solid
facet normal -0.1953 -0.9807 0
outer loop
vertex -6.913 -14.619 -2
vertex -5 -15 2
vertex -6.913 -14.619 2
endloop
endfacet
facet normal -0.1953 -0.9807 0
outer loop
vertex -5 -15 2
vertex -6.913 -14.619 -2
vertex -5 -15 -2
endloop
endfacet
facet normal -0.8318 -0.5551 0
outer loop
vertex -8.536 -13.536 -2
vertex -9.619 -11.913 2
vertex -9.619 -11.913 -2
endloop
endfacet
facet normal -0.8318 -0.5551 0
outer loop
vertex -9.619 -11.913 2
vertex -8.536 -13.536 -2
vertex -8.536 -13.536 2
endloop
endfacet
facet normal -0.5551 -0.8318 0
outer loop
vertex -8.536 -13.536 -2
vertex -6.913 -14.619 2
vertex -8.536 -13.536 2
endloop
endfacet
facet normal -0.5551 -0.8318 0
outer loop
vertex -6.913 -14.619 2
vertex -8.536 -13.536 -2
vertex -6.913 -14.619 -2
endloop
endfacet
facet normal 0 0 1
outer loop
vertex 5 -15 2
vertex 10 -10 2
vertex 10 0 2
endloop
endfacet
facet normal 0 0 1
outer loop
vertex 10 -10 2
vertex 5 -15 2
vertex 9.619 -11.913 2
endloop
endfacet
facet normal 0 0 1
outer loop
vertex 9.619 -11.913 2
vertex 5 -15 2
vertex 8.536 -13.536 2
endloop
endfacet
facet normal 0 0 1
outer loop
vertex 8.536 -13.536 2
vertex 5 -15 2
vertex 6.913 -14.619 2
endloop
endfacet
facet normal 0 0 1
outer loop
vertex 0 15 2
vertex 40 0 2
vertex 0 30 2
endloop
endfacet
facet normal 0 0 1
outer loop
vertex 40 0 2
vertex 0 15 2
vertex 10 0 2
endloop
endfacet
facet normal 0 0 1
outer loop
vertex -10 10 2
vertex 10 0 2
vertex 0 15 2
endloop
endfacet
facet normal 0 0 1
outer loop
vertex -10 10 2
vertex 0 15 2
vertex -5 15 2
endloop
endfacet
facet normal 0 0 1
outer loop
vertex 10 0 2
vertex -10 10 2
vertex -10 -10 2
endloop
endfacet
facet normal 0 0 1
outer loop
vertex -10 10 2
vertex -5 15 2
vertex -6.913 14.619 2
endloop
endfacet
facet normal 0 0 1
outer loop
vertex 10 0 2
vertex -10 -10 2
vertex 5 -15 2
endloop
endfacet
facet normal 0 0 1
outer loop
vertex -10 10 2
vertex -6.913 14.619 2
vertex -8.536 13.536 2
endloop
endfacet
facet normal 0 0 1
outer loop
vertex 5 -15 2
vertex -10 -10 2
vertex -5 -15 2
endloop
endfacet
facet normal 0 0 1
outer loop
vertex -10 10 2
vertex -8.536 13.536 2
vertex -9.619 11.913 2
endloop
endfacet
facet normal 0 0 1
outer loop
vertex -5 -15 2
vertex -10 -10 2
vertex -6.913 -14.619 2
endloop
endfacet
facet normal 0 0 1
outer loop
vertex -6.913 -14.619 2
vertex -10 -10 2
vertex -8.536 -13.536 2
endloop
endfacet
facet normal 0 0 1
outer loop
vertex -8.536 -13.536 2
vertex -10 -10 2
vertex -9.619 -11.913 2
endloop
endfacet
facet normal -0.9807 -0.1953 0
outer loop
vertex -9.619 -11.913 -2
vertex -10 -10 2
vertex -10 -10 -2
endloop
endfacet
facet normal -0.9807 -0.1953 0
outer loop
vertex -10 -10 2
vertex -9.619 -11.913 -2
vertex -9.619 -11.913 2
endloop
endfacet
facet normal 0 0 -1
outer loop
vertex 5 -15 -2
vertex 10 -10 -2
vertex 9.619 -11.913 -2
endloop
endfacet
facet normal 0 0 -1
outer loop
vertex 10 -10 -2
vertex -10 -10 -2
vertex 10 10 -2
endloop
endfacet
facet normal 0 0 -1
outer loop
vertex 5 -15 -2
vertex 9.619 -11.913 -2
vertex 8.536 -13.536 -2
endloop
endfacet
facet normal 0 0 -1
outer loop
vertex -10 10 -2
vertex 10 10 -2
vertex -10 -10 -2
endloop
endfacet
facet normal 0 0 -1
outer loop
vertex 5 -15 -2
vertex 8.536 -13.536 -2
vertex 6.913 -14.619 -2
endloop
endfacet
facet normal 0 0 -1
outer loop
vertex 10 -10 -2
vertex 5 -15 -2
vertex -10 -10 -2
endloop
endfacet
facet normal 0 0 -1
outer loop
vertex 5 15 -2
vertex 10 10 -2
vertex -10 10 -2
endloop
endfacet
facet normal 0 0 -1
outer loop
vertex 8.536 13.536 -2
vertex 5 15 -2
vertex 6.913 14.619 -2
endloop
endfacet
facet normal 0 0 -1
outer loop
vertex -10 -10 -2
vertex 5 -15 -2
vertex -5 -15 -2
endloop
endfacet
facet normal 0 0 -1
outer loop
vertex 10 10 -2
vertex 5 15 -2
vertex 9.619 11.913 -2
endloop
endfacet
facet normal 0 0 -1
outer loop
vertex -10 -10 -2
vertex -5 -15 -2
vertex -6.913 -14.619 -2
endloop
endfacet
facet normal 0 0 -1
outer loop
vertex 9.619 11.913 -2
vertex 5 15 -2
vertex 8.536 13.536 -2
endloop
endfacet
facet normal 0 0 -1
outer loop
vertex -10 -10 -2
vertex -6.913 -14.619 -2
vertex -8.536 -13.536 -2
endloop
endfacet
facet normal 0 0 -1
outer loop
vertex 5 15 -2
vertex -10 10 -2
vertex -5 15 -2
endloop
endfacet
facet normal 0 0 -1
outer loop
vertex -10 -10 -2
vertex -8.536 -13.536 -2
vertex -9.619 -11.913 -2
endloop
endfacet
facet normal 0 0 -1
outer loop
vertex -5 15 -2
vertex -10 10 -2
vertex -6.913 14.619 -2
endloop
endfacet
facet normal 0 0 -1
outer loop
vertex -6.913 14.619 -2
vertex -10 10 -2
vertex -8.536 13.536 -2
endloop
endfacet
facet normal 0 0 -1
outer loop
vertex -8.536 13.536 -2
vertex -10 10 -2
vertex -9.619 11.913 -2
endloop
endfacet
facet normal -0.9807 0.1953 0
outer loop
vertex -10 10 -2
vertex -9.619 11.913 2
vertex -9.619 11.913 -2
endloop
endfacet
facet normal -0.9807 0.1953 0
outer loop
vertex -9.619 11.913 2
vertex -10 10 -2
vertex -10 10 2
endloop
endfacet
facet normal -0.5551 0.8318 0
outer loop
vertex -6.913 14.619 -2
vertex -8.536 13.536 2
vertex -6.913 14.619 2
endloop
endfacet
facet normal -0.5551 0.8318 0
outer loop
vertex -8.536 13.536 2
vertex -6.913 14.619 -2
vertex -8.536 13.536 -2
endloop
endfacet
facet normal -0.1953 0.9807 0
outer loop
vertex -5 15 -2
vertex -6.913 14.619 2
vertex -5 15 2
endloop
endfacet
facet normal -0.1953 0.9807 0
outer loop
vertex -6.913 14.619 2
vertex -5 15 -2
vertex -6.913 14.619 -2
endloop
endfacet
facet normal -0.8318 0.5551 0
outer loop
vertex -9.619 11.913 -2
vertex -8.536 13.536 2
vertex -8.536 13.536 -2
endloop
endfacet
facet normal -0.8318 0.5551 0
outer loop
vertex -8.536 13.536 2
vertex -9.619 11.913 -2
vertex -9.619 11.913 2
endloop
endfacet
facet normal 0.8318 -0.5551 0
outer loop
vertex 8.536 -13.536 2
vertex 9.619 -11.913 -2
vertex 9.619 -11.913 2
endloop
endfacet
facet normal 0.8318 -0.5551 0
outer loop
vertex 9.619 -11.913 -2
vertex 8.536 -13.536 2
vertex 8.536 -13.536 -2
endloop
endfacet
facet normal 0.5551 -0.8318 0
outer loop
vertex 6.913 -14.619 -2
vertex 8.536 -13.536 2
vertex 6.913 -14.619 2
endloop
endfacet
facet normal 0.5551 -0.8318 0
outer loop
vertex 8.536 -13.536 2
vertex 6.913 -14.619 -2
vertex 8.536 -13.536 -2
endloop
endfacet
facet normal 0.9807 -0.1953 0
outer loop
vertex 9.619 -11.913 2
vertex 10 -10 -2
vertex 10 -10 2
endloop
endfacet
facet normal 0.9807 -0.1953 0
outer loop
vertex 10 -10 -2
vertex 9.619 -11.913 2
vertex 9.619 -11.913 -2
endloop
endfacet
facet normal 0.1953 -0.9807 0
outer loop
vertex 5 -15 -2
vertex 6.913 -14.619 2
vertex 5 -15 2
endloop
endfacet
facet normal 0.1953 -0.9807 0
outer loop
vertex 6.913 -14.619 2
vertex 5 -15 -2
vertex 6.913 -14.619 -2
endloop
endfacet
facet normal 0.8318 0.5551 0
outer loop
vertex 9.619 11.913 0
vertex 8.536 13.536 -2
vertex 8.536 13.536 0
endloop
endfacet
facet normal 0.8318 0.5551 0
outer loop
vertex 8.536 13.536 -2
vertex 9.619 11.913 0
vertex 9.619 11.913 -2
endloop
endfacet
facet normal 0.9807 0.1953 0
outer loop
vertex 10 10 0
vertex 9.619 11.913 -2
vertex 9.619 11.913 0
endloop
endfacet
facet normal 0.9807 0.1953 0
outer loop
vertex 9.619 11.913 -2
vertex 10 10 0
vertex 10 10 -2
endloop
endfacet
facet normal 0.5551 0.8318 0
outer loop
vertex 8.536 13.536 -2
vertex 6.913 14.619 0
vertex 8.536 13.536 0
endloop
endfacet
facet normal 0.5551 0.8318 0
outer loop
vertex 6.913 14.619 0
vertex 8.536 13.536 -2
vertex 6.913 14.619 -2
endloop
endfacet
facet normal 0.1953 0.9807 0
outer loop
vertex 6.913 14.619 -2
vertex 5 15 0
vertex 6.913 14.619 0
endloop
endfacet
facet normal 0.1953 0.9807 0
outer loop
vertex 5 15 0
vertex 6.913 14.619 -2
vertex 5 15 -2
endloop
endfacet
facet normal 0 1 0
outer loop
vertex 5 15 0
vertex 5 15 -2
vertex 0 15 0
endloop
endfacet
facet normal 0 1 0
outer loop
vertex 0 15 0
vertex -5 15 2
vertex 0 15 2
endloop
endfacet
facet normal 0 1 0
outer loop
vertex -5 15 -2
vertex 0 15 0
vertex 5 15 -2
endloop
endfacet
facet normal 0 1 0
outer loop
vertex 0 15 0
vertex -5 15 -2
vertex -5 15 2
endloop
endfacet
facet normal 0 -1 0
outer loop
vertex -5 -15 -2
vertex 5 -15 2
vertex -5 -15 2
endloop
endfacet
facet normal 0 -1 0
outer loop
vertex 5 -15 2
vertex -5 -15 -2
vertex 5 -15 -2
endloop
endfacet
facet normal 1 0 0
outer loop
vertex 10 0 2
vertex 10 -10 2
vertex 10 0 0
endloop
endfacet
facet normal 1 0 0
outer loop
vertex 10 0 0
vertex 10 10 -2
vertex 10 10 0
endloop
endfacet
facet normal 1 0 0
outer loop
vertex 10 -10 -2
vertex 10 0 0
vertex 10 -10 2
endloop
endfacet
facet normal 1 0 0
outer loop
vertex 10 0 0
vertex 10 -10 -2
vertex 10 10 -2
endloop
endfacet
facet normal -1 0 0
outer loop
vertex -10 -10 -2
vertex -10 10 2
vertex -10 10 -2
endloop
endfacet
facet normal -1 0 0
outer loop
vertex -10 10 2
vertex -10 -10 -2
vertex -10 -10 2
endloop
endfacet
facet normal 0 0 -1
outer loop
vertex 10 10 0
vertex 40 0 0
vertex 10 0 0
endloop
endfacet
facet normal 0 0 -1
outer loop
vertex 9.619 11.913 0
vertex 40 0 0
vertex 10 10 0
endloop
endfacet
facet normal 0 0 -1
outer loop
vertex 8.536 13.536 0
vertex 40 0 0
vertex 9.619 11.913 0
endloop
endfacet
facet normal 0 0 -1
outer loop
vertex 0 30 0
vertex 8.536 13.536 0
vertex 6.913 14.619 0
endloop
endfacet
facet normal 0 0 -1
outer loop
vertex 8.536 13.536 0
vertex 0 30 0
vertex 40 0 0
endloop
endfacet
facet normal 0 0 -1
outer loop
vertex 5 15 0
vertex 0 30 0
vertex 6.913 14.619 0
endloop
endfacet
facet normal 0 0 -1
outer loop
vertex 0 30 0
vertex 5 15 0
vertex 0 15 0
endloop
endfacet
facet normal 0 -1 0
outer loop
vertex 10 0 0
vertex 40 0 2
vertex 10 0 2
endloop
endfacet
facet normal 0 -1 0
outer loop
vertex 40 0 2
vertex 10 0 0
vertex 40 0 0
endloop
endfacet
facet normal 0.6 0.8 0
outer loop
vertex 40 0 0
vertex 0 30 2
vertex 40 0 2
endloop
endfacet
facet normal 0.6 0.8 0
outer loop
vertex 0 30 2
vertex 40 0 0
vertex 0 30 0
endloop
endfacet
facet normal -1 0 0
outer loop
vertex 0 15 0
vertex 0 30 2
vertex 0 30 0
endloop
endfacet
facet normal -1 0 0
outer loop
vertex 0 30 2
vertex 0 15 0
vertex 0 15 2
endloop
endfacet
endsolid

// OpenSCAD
use <MCAD/boxes.scad>
use <MCAD/triangles.scad>
roundedBox([20,30,4], 5, true);
triangle(30, 40, 2);
